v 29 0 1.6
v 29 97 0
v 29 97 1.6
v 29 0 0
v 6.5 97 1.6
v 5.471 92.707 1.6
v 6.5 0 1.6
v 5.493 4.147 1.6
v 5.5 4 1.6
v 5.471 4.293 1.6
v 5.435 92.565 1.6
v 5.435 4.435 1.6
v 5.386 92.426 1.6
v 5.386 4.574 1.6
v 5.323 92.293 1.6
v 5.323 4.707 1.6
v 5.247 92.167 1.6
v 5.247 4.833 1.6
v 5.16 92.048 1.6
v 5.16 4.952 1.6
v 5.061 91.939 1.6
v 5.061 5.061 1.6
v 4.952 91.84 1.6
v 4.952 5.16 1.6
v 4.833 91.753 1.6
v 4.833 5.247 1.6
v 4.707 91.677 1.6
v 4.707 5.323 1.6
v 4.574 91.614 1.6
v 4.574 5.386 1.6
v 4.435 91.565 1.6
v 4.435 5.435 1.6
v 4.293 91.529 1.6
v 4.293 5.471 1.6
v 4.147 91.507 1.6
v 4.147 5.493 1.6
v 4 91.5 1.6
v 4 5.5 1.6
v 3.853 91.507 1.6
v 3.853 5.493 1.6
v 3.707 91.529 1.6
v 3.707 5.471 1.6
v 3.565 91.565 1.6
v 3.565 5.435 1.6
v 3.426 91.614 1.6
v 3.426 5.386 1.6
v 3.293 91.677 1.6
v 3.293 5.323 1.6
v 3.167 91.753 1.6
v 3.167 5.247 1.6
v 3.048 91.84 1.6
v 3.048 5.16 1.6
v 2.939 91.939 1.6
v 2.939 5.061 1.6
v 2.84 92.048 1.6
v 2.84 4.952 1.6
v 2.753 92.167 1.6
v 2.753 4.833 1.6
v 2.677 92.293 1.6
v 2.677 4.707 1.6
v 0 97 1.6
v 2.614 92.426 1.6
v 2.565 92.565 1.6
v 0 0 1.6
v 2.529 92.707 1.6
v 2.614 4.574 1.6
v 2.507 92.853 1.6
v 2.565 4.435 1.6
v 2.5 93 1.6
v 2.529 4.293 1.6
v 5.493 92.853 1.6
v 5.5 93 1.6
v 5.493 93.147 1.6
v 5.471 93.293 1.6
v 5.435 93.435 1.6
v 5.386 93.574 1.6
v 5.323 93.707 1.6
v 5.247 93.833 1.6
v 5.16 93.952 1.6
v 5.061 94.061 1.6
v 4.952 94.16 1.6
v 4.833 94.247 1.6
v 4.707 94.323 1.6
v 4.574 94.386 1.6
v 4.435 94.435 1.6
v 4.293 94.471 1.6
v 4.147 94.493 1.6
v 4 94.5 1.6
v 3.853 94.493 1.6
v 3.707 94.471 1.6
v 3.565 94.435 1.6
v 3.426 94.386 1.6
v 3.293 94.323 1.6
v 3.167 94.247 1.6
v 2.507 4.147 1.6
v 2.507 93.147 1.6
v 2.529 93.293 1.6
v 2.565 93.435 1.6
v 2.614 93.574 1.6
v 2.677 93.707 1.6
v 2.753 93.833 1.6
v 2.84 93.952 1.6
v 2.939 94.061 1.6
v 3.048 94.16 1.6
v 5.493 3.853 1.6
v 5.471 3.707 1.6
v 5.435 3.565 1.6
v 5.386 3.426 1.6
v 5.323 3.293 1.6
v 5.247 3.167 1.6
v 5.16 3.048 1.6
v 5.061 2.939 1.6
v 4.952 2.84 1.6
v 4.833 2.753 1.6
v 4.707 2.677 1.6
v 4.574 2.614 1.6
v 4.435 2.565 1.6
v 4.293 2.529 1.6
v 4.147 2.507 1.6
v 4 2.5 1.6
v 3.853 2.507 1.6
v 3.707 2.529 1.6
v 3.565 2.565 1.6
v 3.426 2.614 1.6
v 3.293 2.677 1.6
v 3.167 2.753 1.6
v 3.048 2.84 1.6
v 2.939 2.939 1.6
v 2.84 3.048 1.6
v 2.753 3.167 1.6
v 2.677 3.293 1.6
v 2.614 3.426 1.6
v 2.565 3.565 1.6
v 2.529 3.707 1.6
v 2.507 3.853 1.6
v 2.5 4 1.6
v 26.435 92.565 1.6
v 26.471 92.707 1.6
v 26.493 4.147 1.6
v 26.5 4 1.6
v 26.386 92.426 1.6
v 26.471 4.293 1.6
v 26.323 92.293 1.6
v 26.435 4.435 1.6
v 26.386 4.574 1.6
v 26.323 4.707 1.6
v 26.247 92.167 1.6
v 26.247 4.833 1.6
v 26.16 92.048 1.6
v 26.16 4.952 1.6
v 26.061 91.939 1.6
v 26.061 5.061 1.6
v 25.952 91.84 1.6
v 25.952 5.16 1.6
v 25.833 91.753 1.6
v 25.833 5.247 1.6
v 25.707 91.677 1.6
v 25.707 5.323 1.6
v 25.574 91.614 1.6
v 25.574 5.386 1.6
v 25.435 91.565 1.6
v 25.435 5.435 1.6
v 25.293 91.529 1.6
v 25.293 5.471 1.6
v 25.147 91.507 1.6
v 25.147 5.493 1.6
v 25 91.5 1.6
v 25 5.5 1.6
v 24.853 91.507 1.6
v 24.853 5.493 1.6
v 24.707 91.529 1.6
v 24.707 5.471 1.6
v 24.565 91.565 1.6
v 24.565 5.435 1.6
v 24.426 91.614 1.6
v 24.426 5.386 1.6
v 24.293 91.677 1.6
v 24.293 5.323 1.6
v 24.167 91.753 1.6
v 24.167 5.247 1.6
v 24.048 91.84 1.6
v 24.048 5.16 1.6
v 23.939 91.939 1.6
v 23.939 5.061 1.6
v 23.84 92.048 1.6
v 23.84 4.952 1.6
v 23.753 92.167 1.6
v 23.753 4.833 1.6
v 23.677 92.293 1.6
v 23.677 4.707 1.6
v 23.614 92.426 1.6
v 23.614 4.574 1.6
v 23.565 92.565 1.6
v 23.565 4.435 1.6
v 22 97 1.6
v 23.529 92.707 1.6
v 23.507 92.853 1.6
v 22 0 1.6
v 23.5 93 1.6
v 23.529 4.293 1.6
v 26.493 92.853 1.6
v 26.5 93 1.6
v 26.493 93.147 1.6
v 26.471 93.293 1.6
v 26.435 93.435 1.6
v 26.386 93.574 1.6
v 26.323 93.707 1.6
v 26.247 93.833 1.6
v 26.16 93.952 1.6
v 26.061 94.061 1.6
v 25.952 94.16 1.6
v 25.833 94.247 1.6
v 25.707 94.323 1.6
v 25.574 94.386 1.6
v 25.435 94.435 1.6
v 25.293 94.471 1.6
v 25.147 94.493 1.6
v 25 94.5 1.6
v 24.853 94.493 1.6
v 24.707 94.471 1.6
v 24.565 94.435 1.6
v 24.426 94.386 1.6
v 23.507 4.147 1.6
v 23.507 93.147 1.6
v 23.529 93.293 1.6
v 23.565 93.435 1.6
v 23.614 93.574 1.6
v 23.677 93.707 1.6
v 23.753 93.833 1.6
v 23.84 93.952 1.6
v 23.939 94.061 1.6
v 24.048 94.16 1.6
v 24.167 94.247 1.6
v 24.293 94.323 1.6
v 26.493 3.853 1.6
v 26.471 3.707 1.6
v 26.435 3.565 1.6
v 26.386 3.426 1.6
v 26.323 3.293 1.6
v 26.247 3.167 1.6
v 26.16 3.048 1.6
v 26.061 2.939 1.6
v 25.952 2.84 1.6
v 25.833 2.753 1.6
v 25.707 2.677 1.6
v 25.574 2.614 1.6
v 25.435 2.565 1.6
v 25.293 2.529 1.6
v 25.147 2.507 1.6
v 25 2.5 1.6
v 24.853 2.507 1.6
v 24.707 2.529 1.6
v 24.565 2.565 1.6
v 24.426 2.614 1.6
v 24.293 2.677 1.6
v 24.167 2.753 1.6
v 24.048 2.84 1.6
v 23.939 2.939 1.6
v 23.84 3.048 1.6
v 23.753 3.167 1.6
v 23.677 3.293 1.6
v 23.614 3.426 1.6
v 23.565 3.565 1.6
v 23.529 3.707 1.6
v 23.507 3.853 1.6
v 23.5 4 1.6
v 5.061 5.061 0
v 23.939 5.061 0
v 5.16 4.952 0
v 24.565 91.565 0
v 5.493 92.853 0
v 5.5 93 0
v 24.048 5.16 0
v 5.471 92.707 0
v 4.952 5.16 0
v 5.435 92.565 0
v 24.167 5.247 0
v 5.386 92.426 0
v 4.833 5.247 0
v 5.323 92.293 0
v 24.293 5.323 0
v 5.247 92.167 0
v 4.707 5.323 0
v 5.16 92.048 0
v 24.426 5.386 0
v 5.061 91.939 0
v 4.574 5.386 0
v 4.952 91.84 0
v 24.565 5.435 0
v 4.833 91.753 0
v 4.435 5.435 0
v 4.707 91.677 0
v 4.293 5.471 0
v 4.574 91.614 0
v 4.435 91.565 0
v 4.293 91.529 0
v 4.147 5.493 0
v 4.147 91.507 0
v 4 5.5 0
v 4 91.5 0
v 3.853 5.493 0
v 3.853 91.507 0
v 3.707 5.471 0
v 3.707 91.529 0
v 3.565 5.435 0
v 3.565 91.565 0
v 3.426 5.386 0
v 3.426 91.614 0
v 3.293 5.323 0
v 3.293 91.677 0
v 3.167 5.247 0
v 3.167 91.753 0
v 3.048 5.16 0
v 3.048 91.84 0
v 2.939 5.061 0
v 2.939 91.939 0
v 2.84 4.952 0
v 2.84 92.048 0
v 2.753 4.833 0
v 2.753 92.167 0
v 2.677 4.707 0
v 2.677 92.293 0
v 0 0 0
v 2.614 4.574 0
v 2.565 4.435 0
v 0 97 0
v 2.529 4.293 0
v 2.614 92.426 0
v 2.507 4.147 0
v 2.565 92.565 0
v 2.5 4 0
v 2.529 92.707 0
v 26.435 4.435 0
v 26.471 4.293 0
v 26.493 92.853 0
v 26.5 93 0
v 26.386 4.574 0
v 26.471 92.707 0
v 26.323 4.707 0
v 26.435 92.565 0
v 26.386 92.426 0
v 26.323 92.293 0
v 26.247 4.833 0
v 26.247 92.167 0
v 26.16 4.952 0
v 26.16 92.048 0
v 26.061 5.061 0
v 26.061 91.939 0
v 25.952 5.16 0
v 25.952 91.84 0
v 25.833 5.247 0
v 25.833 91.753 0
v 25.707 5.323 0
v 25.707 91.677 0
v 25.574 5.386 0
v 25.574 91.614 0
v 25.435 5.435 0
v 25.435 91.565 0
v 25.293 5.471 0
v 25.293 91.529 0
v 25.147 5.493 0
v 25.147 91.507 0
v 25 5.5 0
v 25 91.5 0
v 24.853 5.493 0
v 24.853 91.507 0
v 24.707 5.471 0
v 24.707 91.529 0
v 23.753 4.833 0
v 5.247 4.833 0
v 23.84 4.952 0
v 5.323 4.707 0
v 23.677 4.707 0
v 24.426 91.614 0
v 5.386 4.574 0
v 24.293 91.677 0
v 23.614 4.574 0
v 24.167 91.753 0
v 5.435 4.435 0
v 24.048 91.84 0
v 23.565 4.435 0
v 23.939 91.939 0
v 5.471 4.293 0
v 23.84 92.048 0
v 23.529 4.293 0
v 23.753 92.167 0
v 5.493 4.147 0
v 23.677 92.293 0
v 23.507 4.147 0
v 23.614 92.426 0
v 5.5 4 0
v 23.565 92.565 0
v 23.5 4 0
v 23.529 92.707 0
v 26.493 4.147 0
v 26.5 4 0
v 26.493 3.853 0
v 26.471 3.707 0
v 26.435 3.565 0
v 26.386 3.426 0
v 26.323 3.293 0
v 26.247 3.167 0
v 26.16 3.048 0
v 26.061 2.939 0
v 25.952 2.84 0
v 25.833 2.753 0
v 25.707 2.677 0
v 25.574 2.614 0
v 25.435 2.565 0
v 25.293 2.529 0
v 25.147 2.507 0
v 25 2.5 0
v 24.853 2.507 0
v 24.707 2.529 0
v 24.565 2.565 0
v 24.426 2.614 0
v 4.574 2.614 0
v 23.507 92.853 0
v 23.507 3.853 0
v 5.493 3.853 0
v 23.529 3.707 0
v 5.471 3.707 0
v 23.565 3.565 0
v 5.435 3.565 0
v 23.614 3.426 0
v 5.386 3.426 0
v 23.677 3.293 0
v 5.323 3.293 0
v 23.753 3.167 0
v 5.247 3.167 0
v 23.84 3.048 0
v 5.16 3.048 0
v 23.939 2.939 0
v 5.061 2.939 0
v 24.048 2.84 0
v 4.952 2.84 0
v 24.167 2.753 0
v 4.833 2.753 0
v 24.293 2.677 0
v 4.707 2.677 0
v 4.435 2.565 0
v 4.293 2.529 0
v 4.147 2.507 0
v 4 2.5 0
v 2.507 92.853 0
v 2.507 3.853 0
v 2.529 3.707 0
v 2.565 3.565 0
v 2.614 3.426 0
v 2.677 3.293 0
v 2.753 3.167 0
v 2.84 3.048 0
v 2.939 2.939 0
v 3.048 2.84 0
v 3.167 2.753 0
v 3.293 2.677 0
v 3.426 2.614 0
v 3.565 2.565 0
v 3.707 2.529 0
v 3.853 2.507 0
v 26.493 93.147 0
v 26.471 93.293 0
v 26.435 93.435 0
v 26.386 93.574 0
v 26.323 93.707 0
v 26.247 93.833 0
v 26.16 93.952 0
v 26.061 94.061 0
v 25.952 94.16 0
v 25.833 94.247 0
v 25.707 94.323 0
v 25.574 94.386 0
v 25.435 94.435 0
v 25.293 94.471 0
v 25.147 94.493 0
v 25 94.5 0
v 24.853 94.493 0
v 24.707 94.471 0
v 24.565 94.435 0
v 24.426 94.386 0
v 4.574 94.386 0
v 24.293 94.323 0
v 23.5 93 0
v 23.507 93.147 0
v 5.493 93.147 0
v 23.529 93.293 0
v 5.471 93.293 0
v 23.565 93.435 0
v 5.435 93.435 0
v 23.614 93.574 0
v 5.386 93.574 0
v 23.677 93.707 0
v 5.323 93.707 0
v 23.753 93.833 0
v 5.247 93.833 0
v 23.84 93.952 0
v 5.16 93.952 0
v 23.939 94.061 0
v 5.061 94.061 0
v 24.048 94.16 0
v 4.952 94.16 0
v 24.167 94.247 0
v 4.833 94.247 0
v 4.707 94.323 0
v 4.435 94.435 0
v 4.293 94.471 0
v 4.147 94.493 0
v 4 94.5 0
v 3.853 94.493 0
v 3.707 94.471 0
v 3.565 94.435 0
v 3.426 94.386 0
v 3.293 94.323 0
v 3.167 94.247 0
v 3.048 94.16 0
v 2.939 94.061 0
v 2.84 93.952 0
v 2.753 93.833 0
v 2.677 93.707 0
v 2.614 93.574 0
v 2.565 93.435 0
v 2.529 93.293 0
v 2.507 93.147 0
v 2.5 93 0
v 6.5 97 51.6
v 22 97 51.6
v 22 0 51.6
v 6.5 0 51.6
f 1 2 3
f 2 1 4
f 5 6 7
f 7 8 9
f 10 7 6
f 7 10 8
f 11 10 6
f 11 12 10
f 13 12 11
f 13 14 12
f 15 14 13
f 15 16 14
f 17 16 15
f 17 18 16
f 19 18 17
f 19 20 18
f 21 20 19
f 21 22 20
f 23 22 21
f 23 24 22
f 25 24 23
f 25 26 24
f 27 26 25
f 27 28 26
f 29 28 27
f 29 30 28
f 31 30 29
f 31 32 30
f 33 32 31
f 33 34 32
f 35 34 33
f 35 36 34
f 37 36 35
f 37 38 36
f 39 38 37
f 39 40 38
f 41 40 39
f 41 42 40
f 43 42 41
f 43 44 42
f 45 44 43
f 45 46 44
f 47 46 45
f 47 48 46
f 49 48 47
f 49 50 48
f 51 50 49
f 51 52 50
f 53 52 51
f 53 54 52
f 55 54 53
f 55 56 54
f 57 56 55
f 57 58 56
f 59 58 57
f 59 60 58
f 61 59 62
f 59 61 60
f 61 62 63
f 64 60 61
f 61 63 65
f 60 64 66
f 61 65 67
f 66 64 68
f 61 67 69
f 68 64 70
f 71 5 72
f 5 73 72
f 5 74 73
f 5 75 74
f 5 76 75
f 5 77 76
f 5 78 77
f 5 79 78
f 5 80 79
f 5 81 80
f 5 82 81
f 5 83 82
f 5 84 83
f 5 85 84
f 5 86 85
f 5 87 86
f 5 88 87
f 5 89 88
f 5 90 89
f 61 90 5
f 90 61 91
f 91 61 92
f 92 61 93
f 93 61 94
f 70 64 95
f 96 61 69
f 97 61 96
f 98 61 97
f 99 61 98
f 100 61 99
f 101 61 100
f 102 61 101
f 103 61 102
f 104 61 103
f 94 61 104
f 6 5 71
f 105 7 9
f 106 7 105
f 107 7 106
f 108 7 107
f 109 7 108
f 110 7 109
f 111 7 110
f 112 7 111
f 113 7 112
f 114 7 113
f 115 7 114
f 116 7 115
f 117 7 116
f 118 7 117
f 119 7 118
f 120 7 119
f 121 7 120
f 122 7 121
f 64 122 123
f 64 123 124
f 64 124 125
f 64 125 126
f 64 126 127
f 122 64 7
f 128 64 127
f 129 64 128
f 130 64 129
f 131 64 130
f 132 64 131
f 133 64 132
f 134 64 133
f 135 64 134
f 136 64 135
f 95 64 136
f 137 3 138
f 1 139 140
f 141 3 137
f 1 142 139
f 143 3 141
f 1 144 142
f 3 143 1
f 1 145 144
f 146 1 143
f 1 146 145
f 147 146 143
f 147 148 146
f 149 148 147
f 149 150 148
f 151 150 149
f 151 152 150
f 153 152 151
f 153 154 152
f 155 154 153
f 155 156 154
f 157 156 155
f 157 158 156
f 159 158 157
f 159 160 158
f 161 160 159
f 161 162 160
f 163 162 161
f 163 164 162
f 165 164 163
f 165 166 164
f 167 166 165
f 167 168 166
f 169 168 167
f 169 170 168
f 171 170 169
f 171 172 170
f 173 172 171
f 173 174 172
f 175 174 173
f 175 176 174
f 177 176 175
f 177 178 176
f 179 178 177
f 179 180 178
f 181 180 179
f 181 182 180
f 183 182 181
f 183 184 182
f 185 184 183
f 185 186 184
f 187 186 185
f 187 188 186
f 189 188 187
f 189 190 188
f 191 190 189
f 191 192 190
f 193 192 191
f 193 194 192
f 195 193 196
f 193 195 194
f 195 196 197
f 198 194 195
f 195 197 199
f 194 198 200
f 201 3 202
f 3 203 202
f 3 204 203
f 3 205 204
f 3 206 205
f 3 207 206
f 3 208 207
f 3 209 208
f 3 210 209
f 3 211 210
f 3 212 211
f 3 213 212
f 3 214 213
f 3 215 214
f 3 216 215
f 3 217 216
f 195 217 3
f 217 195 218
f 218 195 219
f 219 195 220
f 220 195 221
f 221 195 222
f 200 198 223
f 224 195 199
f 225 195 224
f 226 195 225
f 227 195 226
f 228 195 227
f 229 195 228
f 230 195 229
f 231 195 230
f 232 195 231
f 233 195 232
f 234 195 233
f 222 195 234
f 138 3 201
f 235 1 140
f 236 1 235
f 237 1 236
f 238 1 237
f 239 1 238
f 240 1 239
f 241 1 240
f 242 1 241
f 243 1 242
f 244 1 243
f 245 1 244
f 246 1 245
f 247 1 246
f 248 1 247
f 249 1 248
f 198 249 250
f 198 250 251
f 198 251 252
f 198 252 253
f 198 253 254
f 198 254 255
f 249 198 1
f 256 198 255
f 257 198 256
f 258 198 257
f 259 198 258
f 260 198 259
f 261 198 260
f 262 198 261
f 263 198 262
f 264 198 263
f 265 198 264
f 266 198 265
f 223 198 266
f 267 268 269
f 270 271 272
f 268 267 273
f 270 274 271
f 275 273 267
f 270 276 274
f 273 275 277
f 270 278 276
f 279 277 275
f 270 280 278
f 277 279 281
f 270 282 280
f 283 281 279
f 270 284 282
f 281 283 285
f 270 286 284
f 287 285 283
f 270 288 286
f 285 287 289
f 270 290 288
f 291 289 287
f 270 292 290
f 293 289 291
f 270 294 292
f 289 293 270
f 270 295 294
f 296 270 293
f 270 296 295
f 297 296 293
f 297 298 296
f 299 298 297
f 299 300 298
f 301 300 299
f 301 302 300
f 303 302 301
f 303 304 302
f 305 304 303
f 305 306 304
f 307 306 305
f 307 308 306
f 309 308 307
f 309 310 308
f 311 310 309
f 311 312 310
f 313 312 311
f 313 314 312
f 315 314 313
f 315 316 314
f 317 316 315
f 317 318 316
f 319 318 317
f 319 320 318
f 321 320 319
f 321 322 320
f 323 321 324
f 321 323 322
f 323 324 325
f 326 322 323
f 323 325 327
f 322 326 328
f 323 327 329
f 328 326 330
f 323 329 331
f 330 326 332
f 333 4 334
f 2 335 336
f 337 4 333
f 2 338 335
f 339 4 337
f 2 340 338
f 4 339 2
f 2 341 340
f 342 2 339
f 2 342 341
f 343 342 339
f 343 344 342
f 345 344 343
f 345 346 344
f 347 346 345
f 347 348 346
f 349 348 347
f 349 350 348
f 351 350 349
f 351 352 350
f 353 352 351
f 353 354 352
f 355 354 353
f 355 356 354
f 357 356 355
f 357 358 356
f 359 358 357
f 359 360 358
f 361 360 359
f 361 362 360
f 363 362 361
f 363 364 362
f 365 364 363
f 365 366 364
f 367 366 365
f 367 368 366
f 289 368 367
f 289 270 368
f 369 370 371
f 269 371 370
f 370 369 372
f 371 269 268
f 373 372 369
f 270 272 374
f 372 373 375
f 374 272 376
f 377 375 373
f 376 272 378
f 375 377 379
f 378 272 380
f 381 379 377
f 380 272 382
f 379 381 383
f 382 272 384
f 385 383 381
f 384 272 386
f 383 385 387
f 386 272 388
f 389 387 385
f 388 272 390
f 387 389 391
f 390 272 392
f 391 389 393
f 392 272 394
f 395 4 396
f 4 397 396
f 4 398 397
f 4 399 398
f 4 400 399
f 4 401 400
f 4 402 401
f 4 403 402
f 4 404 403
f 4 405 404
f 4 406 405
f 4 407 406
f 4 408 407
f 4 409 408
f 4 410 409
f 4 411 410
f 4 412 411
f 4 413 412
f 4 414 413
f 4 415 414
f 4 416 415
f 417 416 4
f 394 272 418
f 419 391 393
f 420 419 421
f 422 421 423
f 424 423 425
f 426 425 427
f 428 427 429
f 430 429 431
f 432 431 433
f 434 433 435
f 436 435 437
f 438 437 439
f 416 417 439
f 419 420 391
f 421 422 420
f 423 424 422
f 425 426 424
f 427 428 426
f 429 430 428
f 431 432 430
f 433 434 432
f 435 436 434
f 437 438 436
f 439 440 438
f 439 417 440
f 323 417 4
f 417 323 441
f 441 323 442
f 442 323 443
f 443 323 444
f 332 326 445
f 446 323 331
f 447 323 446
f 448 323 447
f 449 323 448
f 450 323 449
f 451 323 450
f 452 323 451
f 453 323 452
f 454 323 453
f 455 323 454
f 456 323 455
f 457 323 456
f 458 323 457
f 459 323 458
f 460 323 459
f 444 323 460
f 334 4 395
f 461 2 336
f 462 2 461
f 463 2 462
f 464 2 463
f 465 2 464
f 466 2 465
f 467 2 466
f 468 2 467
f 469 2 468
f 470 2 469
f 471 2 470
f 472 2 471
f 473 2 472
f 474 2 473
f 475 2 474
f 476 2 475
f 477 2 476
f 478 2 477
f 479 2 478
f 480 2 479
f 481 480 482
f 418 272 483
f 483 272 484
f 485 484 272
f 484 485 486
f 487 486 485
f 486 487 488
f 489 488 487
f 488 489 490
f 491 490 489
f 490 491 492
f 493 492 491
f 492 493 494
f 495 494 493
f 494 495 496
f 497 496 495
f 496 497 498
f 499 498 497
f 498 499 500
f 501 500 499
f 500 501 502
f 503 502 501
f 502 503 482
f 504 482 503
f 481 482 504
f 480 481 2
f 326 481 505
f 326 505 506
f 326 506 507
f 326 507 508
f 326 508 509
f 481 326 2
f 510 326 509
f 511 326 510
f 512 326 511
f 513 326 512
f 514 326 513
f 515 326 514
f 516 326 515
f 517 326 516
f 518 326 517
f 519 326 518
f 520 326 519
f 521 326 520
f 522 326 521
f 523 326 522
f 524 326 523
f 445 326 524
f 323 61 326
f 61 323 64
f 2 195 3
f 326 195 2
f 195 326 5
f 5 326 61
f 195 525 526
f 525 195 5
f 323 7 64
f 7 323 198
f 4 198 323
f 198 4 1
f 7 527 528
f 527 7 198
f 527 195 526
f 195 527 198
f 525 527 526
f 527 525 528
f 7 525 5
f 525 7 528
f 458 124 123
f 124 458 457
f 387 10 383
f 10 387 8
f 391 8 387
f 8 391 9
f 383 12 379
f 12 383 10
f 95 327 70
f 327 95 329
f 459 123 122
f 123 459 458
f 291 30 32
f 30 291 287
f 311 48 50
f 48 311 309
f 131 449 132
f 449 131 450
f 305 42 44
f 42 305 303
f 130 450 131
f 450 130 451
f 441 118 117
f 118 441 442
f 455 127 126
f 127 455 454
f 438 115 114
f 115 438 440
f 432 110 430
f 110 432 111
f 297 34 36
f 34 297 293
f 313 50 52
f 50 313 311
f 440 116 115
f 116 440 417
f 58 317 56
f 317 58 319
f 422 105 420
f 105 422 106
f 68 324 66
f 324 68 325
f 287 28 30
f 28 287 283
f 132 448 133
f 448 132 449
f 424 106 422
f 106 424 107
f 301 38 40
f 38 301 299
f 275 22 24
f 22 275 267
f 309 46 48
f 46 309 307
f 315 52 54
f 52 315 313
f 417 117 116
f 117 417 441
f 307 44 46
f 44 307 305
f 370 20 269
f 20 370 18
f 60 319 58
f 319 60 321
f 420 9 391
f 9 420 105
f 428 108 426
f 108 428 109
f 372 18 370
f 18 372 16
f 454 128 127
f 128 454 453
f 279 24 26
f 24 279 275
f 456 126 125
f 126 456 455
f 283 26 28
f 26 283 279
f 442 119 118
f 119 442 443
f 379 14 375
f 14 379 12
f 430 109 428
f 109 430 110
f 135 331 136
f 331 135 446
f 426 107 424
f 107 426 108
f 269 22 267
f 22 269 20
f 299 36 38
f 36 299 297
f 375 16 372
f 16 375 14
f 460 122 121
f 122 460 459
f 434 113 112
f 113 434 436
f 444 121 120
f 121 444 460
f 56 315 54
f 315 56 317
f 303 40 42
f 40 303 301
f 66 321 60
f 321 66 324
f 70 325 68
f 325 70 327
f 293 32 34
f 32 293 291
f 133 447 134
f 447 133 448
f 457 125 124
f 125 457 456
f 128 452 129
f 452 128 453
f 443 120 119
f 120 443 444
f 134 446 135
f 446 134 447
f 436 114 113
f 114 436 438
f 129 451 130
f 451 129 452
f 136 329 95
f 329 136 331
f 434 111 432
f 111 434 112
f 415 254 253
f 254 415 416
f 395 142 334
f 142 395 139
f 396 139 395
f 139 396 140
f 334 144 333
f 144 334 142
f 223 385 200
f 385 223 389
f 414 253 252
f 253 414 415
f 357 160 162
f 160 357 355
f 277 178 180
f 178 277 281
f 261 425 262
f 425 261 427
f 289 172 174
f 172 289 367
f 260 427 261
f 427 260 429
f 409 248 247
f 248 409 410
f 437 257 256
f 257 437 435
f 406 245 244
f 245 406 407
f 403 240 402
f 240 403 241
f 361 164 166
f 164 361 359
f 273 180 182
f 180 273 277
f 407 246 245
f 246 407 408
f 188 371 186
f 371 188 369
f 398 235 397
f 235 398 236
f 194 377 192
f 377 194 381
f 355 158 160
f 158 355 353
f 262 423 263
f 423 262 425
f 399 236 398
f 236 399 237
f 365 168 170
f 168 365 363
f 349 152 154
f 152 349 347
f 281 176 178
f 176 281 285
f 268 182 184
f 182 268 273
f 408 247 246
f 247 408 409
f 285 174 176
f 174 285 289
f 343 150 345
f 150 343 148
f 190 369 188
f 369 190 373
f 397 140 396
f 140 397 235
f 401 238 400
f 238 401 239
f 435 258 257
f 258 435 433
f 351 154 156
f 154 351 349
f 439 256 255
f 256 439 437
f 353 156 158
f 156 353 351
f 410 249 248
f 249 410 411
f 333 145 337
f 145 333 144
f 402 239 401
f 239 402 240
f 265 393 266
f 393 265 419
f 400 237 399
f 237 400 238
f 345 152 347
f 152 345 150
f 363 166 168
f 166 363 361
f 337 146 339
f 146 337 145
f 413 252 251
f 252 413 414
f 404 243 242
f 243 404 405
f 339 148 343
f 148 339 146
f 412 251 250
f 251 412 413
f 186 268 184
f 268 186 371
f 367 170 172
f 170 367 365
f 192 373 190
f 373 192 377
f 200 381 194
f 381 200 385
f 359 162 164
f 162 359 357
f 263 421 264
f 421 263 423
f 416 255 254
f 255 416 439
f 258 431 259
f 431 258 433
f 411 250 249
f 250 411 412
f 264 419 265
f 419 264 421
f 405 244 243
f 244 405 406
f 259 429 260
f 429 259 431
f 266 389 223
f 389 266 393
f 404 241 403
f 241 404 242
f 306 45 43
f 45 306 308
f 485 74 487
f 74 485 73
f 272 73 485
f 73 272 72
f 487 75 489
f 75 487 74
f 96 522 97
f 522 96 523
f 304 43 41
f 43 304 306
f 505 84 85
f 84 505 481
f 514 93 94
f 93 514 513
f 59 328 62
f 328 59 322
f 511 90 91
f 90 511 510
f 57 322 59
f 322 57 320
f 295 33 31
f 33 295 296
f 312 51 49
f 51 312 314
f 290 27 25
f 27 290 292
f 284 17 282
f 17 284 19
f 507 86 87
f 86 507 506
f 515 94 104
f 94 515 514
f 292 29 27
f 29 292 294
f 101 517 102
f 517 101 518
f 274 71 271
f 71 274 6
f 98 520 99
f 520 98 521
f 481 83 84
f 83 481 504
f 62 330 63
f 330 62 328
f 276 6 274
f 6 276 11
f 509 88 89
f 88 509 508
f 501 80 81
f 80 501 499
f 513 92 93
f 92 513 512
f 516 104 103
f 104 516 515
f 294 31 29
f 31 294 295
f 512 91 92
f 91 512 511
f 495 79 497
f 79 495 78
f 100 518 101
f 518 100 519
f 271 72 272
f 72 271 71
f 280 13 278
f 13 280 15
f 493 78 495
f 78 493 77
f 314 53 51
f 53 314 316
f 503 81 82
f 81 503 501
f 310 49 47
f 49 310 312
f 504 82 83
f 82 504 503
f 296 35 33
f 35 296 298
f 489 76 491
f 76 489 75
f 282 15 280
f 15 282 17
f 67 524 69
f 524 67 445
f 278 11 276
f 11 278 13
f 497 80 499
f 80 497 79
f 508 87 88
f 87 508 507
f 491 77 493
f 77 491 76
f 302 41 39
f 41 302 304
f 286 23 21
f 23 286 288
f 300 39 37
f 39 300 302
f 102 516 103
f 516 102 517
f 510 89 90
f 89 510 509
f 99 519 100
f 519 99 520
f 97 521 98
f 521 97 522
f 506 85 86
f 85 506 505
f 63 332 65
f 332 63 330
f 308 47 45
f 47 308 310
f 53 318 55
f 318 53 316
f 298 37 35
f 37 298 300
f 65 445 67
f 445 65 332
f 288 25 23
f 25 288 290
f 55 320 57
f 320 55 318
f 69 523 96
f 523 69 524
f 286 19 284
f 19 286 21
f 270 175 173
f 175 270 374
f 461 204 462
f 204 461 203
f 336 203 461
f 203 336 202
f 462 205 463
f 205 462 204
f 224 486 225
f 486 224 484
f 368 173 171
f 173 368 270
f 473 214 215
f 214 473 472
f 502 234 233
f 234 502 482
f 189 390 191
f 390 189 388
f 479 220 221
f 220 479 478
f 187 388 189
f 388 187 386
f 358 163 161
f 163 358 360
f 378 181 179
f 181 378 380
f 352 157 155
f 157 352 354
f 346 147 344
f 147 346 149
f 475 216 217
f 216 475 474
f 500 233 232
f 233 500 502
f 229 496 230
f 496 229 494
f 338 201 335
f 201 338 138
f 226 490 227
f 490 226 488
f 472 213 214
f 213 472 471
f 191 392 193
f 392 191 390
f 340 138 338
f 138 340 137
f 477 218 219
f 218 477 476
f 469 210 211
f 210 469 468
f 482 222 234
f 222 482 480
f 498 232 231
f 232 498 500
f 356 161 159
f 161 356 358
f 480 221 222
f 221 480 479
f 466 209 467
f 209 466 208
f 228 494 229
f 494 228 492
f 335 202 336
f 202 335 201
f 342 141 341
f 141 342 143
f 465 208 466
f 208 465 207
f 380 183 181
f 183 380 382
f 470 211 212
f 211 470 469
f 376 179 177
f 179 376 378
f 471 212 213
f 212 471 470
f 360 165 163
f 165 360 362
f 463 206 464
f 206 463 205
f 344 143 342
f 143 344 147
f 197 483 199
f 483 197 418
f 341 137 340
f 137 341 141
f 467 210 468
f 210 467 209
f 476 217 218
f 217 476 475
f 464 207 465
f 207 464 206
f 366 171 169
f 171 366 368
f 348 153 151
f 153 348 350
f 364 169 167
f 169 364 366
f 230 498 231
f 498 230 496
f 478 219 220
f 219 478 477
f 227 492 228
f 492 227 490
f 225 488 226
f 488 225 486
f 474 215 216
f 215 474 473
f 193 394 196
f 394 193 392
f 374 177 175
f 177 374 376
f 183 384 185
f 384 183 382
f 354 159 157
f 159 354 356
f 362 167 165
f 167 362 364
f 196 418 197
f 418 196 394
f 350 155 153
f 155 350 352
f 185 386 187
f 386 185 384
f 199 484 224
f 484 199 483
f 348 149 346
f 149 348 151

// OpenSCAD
// file: printConfig.scad
/**********************************************************************************************************************
  Slack config to standardize different usages of slack/tolerance values.

  The purpose of this config is to introduce some consistency with how slack values defined in code. E.g. Why is the
  slack value defined as 0.3 in this file, but 0.4 in another? This will also allow model-level adjustments for tighter
  fitting parts, for when it might not convenient to adjust the actual 3d printer (using a 3d printer at a makerspace,
  for example).

  Some important details:
    - The general philosophy for slack applications in this project is to subtract space from sockets, while not
      modifying the plugs.
    - Values are signed. Positive values can be interpreted as how much to remove from the socket along some dimension.
    - These values depend on print orientation and it's assumed parts are printed in their recommended orientations.
*/
xySlack = 0.25;

radiusXYSlack = xySlack/2;

zSlack = 0.0;

overhangSlack = 0.5;

supportedOverhangSlack = 0.5;

// special slack cases, change if neccessary
xBarYBarDovetailSlack = xySlack;

/**********************************************************************************************************************
  Printer/slicer config, mainly used for calculating some special overhangs.
*/
defaultLayerHeight = 0.3;
// file: screws.scad
include <printConfig.scad>
include <math.scad>


/********************************************************************************/
// M3 dimensions
m3Diameter = 3.0;
m3Radius = m3Diameter / 2.0;
m3RadiusSlacked = m3Radius + radiusXYSlack;

m3CounterSunkHeadRadius = 3;
m3CounterSunkHeadLength = 1.7;

m3HexNutWidthAcrossFlats = 5.41;
m3HexNutWidthAcrossCorners = FtoG(m3HexNutWidthAcrossFlats);
m3HexNutThickness = 2.2;

/********************************************************************************/
// M4 dimensions
m4Diameter = 4.0;
m4Radius = m4Diameter / 2.0;
m4RadiusSlacked = m4Radius + radiusXYSlack;

m4CounterSunkHeadRadius = 4;
m4CounterSunkHeadLength = 2.3;

m4HexNutWidthAcrossFlats = 6.89;
m4HexNutWidthAcrossCorners = FtoG(m4HexNutWidthAcrossFlats);
m4HexNutThickness = 3.07;

/********************************************************************************/

function screwRadiusSlacked(screwType) =
  (screwType == "m3")
  ? m3RadiusSlacked
  : (screwType == "m4")
  ? m4RadiusSlacked
  : error("Unsupported screw type");

function hexNutThickness(screwType) =
  (screwType == "m3")
  ? m3HexNutThickness
  : (screwType == "m4")
  ? m4HexNutThickness
  : error("Unsupported screw type");


module counterSunkHead_N(screwType, screwExtension=0, headExtension=0) {

  if (screwType == "m3") {
    translate(v = [0, 0, -m3CounterSunkHeadLength])
    union() {
      cylinder(r1 = m3RadiusSlacked, r2 = m3CounterSunkHeadRadius, h = m3CounterSunkHeadLength);

      translate(v = [0, 0, -screwExtension])
      cylinder(r = m3RadiusSlacked, h = screwExtension);

      translate(v = [0, 0, m3CounterSunkHeadLength])
      cylinder(r = m3CounterSunkHeadRadius, h = headExtension);
    }
  } else if (screwType == "m4") {
    translate(v = [0, 0, -m4CounterSunkHeadLength])
    union() {
      cylinder(r1 = m4RadiusSlacked, r2 = m4CounterSunkHeadRadius, h = m4CounterSunkHeadLength);

      translate(v = [0, 0, -screwExtension])
      cylinder(r = m4RadiusSlacked, h = screwExtension);

      translate(v = [0, 0, m4CounterSunkHeadLength])
      cylinder(r = m4CounterSunkHeadRadius, h = headExtension);
    }
  } else {
    error("Unsupported screw type");
  }
}

module hexNut(screwType, center=true) {
  color([1, 1, 1])
  if (screwType == "m3") {
    translate(v = [0, 0,-m3HexNutThickness/2])
    difference() {
      cylinder(r=m3HexNutWidthAcrossCorners/2, h=m3HexNutThickness, $fn=6);
      cylinder(r=m3Radius,h=inf10, center=true);
    }
  } else if (screwType == "m4") {
    translate(v = [0, 0,-m4HexNutThickness/2])
    difference() {
      cylinder(r=m4HexNutWidthAcrossCorners/2, h=m4HexNutThickness, $fn=6);
      cylinder(r=m4Radius,h=inf10, center=true);
    }
  } else {
    error("Unsupported screw type");
  }
}

module hexNutPocket_N(screwType, openSide=true, backSpace=inf10, bridgeFront=false, bridgeBack=false ) {

  heightSlack = bridgeFront || bridgeBack ? overhangSlack: xySlack;

  if (screwType == "m3") {
    hexNutPocketHelper_N(m3RadiusSlacked, (m3HexNutWidthAcrossCorners+xySlack) / 2, m3HexNutThickness + heightSlack, openSide=openSide, backSpace=backSpace, bridgeFront=bridgeFront, bridgeBack=bridgeBack);
  } else if (screwType == "m4") {
    hexNutPocketHelper_N(m4RadiusSlacked, (m4HexNutWidthAcrossCorners+xySlack) / 2, m4HexNutThickness + heightSlack, openSide=openSide, backSpace=backSpace, bridgeFront=bridgeFront, bridgeBack=bridgeBack);
  } else {
    error("Unsupported screw type");
  }
}

// module hexNutPocketHelper_N(innerRadius, widthAcrossCorners, thickness, openSide=true, backSpace=inf10, bridgeFront=false, bridgeBack=false) {

//   assert (!(bridgeFront && bridgeBack));
//   assert (!(openSide && bridgeFront));

//   union() {
//     hull() {
//       // hexagonal prism representing where the nut should fit
//       cylinder(r = widthAcrossCorners, h = thickness, center = true, $fn = 6);

//       // negative volume for sliding in the nut
//       translate(v = [inf50, 0, 0])
//       cylinder(r = widthAcrossCorners, h = thickness, center = true, $fn = 6);
//     }

//     // negative volume for screw
//     union() {
//       // screw lead spacing
//       translate(v = [0, 0, -backSpace])
//       cylinder(r = innerRadius, h = backSpace, $fn = 32);

//       cylinder(r=innerRadius, h=inf50, $fn=32);

//       if (bridgeFront) {
//         union() {
//           // first bridge layer
//           translate(v=[0,0,thickness/2 + defaultLayerHeight/2])
//           cube(size=[2*innerRadius, GtoF(widthAcrossCorners)*2, defaultLayerHeight], center=true);
//           // second bridge layer
//           translate(v=[0,0,thickness/2 + defaultLayerHeight])
//           cube(size=[2*innerRadius, 2*innerRadius, defaultLayerHeight], center=true);
//         }
//       }

//       if (bridgeBack) {
//         union() {
//           // first bridge layer
//           translate(v=[0,0,-(thickness/2 + defaultLayerHeight/2)])
//           cube(size=[2*innerRadius, GtoF(widthAcrossCorners)*2, defaultLayerHeight], center=true);
//           // second bridge layer
//           translate(v=[0,0,-(thickness/2 + defaultLayerHeight)])
//           cube(size=[2*innerRadius, 2*innerRadius, defaultLayerHeight], center=true);
//         }
//       }
//     }

//     if (openSide) {
//       hull() {
//         translate(v = [inf50, 0, 0])
//         cylinder(r = innerRadius, h = inf50, $fn = 32);
//         cylinder(r = innerRadius, h = inf50, $fn = 32);
//       }
//     }
//   }



// Convert a regular hexagon widthAcrossFlats to widthAcrossCorners
function FtoG(widthAcrossFlats) = widthAcrossFlats * (2 / sqrt(3));

// Convert a regular hexagon widthAcrossCorners to widthAcrossFlats
function GtoF(widthAcrossCorners) = widthAcrossCorners * (sqrt(3) / 2);
// file: math.scad
$fn=64; // render quality
eps=0.01;
inf = 1000;

function unit(v) = v/norm(v);

function lerp(a, b, t) = (b * t + a * (1 - t));


/* Example usage:
for (i=mirror4XY(p=[0,0,0], dx=90, dy=90))
   { translate(v=i) something(); }
*/
module mirror4XY(p, dx, dy) {

    px = p[0];
    py = p[1];
    pz = p[2];

    translate(v=[px, py, pz])
    children(0);

    translate(v=[px+dx, py, pz])
    children(0);

    translate(v=[px, py+dy, pz])
    children(0);

    translate(v=[px+dx, py+dy, pz])
    children(0);
}


// Some matrix transformations

identity = [
    [1,0,0,0],
    [0,1,0,0],
    [0,0,1,0],
    [0,0,0,1],
  ];

function scale(v) = [
    [v[0],0,0,0],
    [0,v[1],0,0],
    [0,0,v[2],0],
    [0,0,0,1]
  ];

function rotatex(a) = [
    [1,0,0,0],
    [0,cos(a),-sin(a),0],
    [0,sin(a),cos(a),0],
    [0,0,0,1]
  ];

function rotatey(a) = [
    [cos(a),0,sin(a),0],
    [0,1,0,0],
    [-sin(a),0,cos(a),0],
    [0,0,0,1]
  ];

function rotatez(a) = [
    [cos(a),-sin(a),0,0],
    [sin(a),cos(a),0,0],
    [0,0,1,0],
    [0,0,0,1]
  ];

function rotate(a,v) =
  (v == undef)
  ? rotatez(a[2])*rotatey(a[1])*rotatex(a[0])
  : rotateanv(a,v/sqrt(v*v));

function translate(v) = [
    [1,0,0,v[0]],
    [0,1,0,v[1]],
    [0,0,1,v[2]],
    [0,0,0,1]
  ];

function mirrorabc(a,b,c) = [
    [1-2*a*a,-2*a*b,-2*a*c,0],
    [-2*a*b,1-2*b*b,-2*b*c,0],
    [-2*a*c,-2*b*c,1-2*c*c,0],
    [0,0,0,1]
  ];

function mirrornv(nv) = mirrorabc(nv[0],nv[1],nv[2]);

function mirror(v) = mirrornv(v/sqrt(v*v));


// taken from https://github.com/openscad/openscad/issues/1040#issuecomment-233208606
function det4x4(a) =
a[0][0]*a[1][1]*a[2][2]*a[3][3] + a[0][0]*a[1][2]*a[2][3]*a[3][1] + a[0][0]*a[1][3]*a[2][1]*a[3][2]
  + a[0][1]*a[1][0]*a[2][3]*a[3][2] + a[0][1]*a[1][2]*a[2][0]*a[3][3] + a[0][1]*a[1][3]*a[2][2]*a[3][0]
  + a[0][2]*a[1][0]*a[2][1]*a[3][3] + a[0][2]*a[1][1]*a[2][3]*a[3][0] + a[0][2]*a[1][3]*a[2][0]*a[3][1]
  + a[0][3]*a[1][0]*a[2][2]*a[3][1] + a[0][3]*a[1][1]*a[2][0]*a[3][2] + a[0][3]*a[1][2]*a[2][1]*a[3][0]
  - a[0][0]*a[1][1]*a[2][3]*a[3][2] - a[0][0]*a[1][2]*a[2][1]*a[3][3] - a[0][0]*a[1][3]*a[2][2]*a[3][1]
  - a[0][1]*a[1][0]*a[2][2]*a[3][3] - a[0][1]*a[1][2]*a[2][3]*a[3][0] - a[0][1]*a[1][3]*a[2][0]*a[3][2]
  - a[0][2]*a[1][0]*a[2][3]*a[3][1] - a[0][2]*a[1][1]*a[2][0]*a[3][3] - a[0][2]*a[1][3]*a[2][1]*a[3][0]
  - a[0][3]*a[1][0]*a[2][1]*a[3][2] - a[0][3]*a[1][1]*a[2][2]*a[3][0] - a[0][3]*a[1][2]*a[2][0]*a[3][1];

function invb00(a) = a[1][1]*a[2][2]*a[3][3] + a[1][2]*a[2][3]*a[3][1] + a[1][3]*a[2][1]*a[3][2] - a[1][1]*a[2][3]*a[3][2] - a[1][2]*a[2][1]*a[3][3] - a[1][3]*a[2][2]*a[3][1];

function invb01(a) = a[0][1]*a[2][3]*a[3][2] + a[0][2]*a[2][1]*a[3][3] + a[0][3]*a[2][2]*a[3][1] - a[0][1]*a[2][2]*a[3][3] - a[0][2]*a[2][3]*a[3][1] - a[0][3]*a[2][1]*a[3][2];

function invb02(a) = a[0][1]*a[1][2]*a[3][3] + a[0][2]*a[1][3]*a[3][1] + a[0][3]*a[1][1]*a[3][2] - a[0][1]*a[1][3]*a[3][2] - a[0][2]*a[1][1]*a[3][3] - a[0][3]*a[1][2]*a[3][1];

function invb03(a) = a[0][1]*a[1][3]*a[2][2] + a[0][2]*a[1][1]*a[2][3] + a[0][3]*a[1][2]*a[2][1] - a[0][1]*a[1][2]*a[2][3] - a[0][2]*a[1][3]*a[2][1] - a[0][3]*a[1][1]*a[2][2];

function invb10(a) = a[1][0]*a[2][3]*a[3][2] + a[1][2]*a[2][0]*a[3][3] + a[1][3]*a[2][2]*a[3][0] - a[1][0]*a[2][2]*a[3][3] - a[1][2]*a[2][3]*a[3][0] - a[1][3]*a[2][0]*a[3][2];

function invb11(a) = a[0][0]*a[2][2]*a[3][3] + a[0][2]*a[2][3]*a[3][0] + a[0][3]*a[2][0]*a[3][2] - a[0][0]*a[2][3]*a[3][2] - a[0][2]*a[2][0]*a[3][3] - a[0][3]*a[2][2]*a[3][0];

function invb12(a) = a[0][0]*a[1][3]*a[3][2] + a[0][2]*a[1][0]*a[3][3] + a[0][3]*a[1][2]*a[3][0] - a[0][0]*a[1][2]*a[3][3] - a[0][2]*a[1][3]*a[3][0] - a[0][3]*a[1][0]*a[3][2];

function invb13(a) = a[0][0]*a[1][2]*a[2][3] + a[0][2]*a[1][3]*a[2][0] + a[0][3]*a[1][0]*a[2][2] - a[0][0]*a[1][3]*a[2][2] - a[0][2]*a[1][0]*a[2][3] - a[0][3]*a[1][2]*a[2][0];

function invb20(a) = a[1][0]*a[2][1]*a[3][3] + a[1][1]*a[2][3]*a[3][0] + a[1][3]*a[2][0]*a[3][1] - a[1][0]*a[2][3]*a[3][1] - a[1][1]*a[2][0]*a[3][3] - a[1][3]*a[2][1]*a[3][0];

function invb21(a) = a[0][0]*a[2][3]*a[3][1] + a[0][1]*a[2][0]*a[3][3] + a[0][3]*a[2][1]*a[3][0] - a[0][0]*a[2][1]*a[3][3] - a[0][1]*a[2][3]*a[3][0] - a[0][3]*a[2][0]*a[3][1];

function invb22(a) = a[0][0]*a[1][1]*a[3][3] + a[0][1]*a[1][3]*a[3][0] + a[0][3]*a[1][0]*a[3][1] - a[0][0]*a[1][3]*a[3][1] - a[0][1]*a[1][0]*a[3][3] - a[0][3]*a[1][1]*a[3][0];

function invb23(a) = a[0][0]*a[1][3]*a[2][1] + a[0][1]*a[1][0]*a[2][3] + a[0][3]*a[1][1]*a[2][0] - a[0][0]*a[1][1]*a[2][3] - a[0][1]*a[1][3]*a[2][0] - a[0][3]*a[1][0]*a[2][1];

function invb30(a) = a[1][0]*a[2][2]*a[3][1] + a[1][1]*a[2][0]*a[3][2] + a[1][2]*a[2][1]*a[3][0] - a[1][0]*a[2][1]*a[3][2] - a[1][1]*a[2][2]*a[3][0] - a[1][2]*a[2][0]*a[3][1];

function invb31(a) = a[0][0]*a[2][1]*a[3][2] + a[0][1]*a[2][2]*a[3][0] + a[0][2]*a[2][0]*a[3][1] - a[0][0]*a[2][2]*a[3][1] - a[0][1]*a[2][0]*a[3][2] - a[0][2]*a[2][1]*a[3][0];

function invb32(a) = a[0][0]*a[1][2]*a[3][1] + a[0][1]*a[1][0]*a[3][2] + a[0][2]*a[1][1]*a[3][0] - a[0][0]*a[1][1]*a[3][2] - a[0][1]*a[1][2]*a[3][0] - a[0][2]*a[1][0]*a[3][1];

function invb33(a) = a[0][0]*a[1][1]*a[2][2] + a[0][1]*a[1][2]*a[2][0] + a[0][2]*a[1][0]*a[2][1] - a[0][0]*a[1][2]*a[2][1] - a[0][1]*a[1][0]*a[2][2] - a[0][2]*a[1][1]*a[2][0];

function inv4x4(a)= (1/det4x4(a))*[
    [invb00(a),invb01(a),invb02(a),invb03(a)],
    [invb10(a),invb11(a),invb12(a),invb13(a)],
    [invb20(a),invb21(a),invb22(a),invb23(a)],
    [invb30(a),invb31(a),invb32(a),invb33(a)]];
// file: dimensions.scad
/*

  Contains some the main case variables. These all exist within a single file, as most of these variables can have
  pretty complicated dependencies on other variables. For example, the size of the main board and thickness of the
  IO board directly affects the dimensions of the case.

  All dimensions are in millimetres, unless otherwise stated.
  
*/

// General PCB settings

pcbThickness = 1.6;

pcbMountHoleType = "m3";
pcbMountHoleDist = 4;  // X (or Y) distance between the midpoint of the pcb mount hole and the edge of the PCB.



// Main Board

mainBoardX = 62.5; // What "X" and "Y" values are are local to the main board module
mainBoardY = 97.0;

mainBoardBottomClearance = 6; // Here, the "bottom" is the bottom side where you solder the through hole components.

mainBoardScrewHoleDx = mainBoardX - 2*pcbMountHoleDist;
mainBoardScrewHoleDy = mainBoardY - 2*pcbMountHoleDist;

// IO Board

ioBoardX = 29.0;
ioBoardY = 97.0;

ioBoardBottomClearance = 5;

ioBoardScrewHoleDx = ioBoardX - 2*pcbMountHoleDist;
ioBoardScrewHoleDy = ioBoardY - 2*pcbMountHoleDist;


// Case values

wallThickness = 3;
pcbSpacing = 3;
// main file
include <dimensions.scad>
include <math.scad>
include <screws.scad>


module ioBoard(negative=false) {

    difference() {

        union() {
            color(c=[0.1,0.6,0.1]) // pcb green
                cube(size=[ioBoardX, ioBoardY, pcbThickness]);

            color(c=[1,0,0])
                if (negative) {

                    buttonCutoutDx = 6.5;
                    buttonCutoutX = 15.5;

                    translate(v=[buttonCutoutDx, 0, pcbThickness])
                        cube(size=[buttonCutoutX, ioBoardY, 50]);
                }
        }

        mirror4XY(p=[pcbMountHoleDist,pcbMountHoleDist,0], dx=ioBoardScrewHoleDx, dy=ioBoardScrewHoleDy)
            cylinder(r=m3Radius, h=inf);

            
    }
}

ioBoard(negative=true);
